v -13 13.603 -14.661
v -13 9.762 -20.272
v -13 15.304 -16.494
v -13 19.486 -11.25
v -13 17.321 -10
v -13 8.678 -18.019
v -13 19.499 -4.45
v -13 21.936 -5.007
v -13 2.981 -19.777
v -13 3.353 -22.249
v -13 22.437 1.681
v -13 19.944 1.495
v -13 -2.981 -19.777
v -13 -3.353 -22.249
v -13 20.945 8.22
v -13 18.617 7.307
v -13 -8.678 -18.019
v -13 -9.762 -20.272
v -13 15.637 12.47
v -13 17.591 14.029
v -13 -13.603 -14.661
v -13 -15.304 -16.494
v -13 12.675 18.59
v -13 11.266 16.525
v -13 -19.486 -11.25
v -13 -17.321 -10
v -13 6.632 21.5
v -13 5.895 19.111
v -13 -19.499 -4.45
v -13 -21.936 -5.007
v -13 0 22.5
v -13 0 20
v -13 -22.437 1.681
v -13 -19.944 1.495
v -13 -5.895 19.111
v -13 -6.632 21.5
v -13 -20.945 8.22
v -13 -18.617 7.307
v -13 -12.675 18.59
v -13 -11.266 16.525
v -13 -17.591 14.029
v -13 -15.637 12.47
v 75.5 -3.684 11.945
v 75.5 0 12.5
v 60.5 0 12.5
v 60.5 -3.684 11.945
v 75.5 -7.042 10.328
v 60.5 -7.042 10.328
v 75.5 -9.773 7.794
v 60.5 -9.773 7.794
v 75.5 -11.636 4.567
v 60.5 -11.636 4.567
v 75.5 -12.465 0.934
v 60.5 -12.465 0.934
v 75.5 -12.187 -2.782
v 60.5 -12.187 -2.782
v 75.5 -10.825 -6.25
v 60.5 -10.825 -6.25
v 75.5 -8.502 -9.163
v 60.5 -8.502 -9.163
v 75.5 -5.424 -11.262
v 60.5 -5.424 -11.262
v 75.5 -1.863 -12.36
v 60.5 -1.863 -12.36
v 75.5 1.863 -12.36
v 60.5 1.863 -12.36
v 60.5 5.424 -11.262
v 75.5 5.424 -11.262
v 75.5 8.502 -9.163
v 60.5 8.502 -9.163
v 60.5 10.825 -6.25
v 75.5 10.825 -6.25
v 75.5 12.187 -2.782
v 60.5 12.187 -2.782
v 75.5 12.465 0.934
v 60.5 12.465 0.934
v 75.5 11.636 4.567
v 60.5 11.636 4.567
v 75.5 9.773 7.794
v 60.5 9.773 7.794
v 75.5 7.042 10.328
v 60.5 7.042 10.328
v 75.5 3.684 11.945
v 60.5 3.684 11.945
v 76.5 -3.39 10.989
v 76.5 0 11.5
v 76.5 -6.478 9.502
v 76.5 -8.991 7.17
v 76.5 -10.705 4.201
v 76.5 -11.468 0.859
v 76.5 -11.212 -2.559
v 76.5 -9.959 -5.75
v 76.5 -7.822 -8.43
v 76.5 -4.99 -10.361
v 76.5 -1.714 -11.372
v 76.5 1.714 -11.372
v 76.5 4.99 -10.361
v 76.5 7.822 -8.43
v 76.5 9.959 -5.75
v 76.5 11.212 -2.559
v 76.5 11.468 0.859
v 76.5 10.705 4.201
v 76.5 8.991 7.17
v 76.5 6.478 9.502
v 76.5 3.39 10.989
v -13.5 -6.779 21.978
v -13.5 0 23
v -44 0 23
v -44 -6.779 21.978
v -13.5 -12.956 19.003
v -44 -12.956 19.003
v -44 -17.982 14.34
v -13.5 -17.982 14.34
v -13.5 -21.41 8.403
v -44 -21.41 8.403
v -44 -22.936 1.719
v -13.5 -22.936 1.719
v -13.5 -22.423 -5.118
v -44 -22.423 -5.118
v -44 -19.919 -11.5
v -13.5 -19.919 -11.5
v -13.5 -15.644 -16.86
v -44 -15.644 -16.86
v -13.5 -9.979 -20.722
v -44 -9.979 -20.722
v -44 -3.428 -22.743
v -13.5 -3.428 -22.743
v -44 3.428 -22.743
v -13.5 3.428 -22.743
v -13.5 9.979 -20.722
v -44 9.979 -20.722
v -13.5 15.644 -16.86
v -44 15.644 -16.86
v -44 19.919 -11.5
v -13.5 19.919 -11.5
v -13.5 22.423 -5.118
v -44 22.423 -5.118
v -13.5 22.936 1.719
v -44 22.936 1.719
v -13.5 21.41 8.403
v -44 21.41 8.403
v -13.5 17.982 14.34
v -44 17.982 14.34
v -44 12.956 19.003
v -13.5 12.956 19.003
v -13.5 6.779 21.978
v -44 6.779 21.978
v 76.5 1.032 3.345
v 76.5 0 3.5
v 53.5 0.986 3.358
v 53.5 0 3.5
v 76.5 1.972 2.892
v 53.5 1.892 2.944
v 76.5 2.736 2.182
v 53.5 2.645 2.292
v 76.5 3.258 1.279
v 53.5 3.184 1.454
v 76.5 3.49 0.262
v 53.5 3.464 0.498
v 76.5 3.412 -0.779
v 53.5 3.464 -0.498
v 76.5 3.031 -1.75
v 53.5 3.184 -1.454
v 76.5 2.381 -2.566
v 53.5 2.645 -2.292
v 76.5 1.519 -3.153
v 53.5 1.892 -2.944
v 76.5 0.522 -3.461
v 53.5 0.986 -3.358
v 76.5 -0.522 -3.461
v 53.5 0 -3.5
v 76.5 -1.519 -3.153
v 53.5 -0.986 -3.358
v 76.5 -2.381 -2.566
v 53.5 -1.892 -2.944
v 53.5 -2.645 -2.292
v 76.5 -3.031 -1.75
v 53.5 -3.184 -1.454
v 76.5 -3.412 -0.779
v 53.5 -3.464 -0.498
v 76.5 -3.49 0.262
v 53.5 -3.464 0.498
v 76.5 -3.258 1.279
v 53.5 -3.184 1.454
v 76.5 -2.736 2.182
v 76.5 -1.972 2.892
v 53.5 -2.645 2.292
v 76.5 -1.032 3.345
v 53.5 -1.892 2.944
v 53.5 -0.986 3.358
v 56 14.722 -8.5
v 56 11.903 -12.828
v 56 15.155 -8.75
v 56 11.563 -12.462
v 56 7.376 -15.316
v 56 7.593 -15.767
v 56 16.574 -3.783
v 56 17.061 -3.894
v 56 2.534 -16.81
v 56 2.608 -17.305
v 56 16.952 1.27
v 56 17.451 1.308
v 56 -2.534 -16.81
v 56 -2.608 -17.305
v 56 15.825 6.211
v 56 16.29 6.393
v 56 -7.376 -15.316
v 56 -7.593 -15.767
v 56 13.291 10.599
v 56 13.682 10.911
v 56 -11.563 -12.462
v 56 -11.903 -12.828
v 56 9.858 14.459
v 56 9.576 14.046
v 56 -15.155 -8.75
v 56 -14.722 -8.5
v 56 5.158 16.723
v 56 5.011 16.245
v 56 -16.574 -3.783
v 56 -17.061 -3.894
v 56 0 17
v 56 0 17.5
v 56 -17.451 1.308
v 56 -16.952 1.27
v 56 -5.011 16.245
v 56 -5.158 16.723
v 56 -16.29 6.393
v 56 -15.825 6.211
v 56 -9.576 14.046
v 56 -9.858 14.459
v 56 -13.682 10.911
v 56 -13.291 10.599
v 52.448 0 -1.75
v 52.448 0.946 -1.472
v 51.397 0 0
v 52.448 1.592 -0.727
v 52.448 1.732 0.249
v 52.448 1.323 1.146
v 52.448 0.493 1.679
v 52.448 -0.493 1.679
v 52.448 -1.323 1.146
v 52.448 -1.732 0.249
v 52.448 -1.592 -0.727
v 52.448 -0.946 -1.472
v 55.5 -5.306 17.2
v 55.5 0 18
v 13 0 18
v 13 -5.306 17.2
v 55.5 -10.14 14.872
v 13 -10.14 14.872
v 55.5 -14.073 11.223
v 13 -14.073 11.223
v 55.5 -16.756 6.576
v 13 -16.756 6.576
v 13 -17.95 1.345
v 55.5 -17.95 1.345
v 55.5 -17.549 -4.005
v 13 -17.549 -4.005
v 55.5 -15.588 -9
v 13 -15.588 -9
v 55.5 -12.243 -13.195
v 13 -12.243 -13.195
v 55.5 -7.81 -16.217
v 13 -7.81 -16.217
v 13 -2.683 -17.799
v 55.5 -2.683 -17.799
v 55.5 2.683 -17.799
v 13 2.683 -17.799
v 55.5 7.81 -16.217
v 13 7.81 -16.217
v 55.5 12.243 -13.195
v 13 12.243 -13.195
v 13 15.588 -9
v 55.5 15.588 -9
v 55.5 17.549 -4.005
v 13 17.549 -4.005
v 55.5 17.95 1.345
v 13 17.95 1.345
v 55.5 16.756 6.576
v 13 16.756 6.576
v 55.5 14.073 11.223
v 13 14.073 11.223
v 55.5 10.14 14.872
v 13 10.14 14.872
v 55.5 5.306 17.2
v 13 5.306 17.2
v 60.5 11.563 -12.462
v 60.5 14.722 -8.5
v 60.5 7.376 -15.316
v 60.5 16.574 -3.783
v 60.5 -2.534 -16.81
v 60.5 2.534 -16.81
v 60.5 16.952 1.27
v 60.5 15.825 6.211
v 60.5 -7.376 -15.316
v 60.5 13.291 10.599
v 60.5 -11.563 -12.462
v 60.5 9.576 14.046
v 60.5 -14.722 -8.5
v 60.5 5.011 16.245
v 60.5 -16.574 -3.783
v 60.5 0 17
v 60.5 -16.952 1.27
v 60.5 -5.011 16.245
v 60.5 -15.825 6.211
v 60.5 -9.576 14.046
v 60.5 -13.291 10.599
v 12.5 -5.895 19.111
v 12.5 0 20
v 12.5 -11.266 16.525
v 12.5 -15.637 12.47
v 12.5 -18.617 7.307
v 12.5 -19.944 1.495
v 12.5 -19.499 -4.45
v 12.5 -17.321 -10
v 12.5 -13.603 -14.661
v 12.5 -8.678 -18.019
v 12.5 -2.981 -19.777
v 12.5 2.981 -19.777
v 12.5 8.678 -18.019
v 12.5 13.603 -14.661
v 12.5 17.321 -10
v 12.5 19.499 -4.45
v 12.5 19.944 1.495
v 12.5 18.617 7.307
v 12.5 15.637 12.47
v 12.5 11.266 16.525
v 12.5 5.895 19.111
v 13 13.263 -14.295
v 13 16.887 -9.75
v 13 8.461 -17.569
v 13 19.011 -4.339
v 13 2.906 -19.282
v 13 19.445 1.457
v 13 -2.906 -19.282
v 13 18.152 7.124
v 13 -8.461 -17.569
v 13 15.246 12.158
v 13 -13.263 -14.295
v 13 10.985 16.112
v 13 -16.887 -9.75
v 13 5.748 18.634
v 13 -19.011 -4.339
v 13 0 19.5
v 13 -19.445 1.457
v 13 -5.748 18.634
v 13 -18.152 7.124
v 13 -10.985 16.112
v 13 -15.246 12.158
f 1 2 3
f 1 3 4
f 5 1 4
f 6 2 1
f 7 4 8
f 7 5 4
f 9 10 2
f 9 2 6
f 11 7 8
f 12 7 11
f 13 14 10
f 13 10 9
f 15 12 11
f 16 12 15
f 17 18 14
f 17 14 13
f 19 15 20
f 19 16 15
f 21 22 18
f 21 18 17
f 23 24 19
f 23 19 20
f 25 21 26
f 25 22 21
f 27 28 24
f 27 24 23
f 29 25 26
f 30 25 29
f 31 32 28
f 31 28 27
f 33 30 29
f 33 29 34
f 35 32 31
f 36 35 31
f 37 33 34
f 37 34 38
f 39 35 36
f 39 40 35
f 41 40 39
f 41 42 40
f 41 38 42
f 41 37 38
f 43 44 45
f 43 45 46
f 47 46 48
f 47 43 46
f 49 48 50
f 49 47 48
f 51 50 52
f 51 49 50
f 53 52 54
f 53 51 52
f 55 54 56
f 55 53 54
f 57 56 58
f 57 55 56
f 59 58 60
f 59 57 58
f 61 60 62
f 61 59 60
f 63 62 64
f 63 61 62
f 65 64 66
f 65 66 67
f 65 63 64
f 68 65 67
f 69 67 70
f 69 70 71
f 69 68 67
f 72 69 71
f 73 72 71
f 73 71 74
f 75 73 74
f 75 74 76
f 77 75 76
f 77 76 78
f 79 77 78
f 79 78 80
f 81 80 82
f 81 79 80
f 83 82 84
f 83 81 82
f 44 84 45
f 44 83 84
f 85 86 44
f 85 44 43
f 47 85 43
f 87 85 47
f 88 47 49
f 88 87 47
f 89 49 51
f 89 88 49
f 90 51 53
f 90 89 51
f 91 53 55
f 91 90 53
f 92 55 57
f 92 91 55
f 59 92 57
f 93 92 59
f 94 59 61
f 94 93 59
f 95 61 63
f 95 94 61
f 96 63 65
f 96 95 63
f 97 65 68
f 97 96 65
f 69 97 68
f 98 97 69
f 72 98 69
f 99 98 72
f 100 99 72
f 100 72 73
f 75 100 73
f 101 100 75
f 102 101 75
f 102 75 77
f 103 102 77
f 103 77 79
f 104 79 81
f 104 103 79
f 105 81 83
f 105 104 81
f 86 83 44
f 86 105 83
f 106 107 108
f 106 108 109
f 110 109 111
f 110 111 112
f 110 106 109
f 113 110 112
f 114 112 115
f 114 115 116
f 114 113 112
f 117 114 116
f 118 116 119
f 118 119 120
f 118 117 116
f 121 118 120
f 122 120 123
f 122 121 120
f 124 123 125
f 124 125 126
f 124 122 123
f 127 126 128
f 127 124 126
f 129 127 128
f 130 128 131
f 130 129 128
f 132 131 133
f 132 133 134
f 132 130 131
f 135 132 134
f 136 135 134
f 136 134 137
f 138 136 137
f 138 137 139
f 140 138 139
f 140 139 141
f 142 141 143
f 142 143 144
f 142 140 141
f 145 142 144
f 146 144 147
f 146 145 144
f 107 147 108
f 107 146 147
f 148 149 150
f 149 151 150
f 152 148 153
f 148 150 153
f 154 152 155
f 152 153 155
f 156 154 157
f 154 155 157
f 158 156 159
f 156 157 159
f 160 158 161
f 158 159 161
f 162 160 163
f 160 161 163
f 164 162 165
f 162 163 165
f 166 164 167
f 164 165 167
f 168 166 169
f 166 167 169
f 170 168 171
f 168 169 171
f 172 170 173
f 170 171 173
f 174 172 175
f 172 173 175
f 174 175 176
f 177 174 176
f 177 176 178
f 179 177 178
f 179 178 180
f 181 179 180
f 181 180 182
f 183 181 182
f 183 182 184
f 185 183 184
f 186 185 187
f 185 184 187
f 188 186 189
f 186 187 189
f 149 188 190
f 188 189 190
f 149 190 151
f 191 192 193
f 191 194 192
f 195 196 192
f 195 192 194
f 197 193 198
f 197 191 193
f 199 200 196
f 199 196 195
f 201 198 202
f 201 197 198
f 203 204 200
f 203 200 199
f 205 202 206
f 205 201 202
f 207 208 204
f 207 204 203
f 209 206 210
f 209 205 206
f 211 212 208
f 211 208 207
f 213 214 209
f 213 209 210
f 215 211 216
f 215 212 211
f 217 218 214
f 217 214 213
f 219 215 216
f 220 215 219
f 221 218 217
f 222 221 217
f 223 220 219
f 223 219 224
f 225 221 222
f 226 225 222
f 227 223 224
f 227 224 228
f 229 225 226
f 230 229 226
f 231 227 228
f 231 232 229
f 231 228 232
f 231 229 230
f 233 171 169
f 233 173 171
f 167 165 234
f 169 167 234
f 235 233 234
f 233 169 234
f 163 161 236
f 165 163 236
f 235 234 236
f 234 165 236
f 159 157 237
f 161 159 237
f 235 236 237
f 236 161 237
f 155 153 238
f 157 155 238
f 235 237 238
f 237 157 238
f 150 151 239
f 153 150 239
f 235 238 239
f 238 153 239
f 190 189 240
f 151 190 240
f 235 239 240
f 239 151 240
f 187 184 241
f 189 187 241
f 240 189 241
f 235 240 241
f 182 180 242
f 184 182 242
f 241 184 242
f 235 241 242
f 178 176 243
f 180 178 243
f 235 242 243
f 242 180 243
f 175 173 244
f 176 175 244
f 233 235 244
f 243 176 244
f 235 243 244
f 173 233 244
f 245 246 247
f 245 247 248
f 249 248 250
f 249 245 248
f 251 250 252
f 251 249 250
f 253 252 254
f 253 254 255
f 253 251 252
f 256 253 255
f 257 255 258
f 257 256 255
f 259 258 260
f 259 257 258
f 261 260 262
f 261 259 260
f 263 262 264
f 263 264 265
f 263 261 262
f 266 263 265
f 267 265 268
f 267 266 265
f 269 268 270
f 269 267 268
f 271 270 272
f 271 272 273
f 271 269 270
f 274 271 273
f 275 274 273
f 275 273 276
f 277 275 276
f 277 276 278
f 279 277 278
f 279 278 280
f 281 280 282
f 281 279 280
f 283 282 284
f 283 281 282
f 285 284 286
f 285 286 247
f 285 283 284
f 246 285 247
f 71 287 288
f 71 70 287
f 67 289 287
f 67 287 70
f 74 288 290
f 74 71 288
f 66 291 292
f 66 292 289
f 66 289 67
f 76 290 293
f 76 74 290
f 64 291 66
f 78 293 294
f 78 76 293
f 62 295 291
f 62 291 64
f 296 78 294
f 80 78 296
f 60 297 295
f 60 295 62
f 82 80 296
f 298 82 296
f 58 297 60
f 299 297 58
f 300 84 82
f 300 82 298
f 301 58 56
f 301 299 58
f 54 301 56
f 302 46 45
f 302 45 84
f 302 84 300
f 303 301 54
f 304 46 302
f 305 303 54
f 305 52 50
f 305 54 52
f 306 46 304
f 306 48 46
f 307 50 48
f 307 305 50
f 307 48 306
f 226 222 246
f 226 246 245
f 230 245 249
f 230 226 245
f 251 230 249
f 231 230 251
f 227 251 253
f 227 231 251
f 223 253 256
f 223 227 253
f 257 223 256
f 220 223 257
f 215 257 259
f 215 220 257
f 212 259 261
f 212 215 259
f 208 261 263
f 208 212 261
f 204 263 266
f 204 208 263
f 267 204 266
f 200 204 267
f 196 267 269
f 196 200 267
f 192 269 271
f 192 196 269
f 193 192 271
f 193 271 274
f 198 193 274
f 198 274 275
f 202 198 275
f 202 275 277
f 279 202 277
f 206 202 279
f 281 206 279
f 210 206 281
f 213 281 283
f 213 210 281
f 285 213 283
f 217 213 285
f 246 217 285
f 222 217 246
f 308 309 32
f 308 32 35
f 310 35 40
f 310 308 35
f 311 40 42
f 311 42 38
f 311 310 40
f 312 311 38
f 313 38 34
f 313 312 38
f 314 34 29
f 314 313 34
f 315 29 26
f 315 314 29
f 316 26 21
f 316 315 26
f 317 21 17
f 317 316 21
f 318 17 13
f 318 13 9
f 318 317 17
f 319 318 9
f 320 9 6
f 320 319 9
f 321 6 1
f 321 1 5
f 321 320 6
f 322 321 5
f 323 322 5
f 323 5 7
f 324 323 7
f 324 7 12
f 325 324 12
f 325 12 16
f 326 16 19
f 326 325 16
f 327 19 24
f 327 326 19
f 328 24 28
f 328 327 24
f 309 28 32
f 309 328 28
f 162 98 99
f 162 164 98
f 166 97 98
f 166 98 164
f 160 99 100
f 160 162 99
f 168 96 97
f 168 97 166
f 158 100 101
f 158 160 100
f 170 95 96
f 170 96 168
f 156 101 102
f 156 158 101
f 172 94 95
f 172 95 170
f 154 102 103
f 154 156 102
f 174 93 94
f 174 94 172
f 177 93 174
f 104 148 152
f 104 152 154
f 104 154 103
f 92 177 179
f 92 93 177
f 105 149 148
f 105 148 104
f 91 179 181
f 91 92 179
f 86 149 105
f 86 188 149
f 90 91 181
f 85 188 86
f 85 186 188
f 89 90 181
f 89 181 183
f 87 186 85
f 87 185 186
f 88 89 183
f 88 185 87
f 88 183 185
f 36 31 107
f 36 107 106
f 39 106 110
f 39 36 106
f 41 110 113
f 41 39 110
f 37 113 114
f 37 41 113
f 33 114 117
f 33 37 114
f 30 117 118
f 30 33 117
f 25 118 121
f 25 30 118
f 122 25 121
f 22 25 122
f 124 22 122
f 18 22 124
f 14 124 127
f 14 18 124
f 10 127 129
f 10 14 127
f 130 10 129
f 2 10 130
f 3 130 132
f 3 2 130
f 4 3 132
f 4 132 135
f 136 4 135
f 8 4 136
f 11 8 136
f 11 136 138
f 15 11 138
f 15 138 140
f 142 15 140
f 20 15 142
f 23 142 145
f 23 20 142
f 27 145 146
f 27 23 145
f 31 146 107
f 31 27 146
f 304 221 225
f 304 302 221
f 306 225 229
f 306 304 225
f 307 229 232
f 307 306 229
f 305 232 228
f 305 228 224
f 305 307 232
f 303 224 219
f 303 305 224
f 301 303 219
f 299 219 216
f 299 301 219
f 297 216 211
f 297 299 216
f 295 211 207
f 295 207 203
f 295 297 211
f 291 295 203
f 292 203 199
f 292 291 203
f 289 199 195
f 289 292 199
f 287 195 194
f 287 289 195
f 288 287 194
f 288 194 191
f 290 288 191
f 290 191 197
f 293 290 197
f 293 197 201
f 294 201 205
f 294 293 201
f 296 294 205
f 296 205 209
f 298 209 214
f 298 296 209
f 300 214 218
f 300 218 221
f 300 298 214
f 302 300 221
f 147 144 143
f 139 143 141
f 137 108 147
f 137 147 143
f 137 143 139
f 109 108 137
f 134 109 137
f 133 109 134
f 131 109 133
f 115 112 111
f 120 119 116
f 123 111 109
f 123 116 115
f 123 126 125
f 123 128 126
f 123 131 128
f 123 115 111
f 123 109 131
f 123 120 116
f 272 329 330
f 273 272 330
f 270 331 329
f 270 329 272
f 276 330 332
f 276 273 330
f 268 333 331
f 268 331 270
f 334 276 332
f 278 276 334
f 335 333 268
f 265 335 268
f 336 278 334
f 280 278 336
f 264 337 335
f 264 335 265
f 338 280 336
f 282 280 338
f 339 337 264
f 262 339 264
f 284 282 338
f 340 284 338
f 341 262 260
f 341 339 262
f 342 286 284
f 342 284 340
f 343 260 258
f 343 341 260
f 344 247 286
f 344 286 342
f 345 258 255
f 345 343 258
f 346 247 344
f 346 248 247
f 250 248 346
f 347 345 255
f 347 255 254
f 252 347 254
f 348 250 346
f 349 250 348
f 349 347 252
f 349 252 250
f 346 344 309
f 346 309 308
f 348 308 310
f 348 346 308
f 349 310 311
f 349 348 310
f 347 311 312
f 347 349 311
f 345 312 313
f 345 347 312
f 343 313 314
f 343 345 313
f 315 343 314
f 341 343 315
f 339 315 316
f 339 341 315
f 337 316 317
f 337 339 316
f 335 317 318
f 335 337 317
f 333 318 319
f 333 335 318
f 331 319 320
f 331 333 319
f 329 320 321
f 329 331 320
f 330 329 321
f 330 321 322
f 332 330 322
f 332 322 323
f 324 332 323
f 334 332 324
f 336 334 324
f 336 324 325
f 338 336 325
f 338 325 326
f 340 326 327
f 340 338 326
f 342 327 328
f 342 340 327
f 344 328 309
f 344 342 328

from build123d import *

# Parameters (mm, degrees)
CHANFREIN1_SIZE           = 0.5
CHANFREIN2_SIZE           = 1
TROU_TARAUD_M8X1_01_D     = 7
TROU_TARAUD_M8X1_01_DEPTH = 23
TROU_TARAUD_M8X1_01_TIP   = 2.103012167


with BuildPart() as part:
    # Esquisse1 → Révolution1 (revolve)
    with BuildSketch(Plane.XY, mode=Mode.PRIVATE) as r_volution1_sk:
        Polygon((-44, 23), (-13, 23), (-13, 20), (13, 20), (13, 18), (56, 18), (56, 17), (60.5, 17), (60.5, 12.5), (76.5, 12.5), (76.5, 0), (-44, 0), align=None)
    revolve(r_volution1_sk.sketch.rotate(Axis((-47.210983023, 0, 0), (1, 0, 0)), 90), axis=Axis((-47.210983023, 0, 0), (1, 0, 0)))

    # Chanfrein1
    chanfrein1_edges = [part.edges().sort_by_distance(p)[0] for p in [
        (56, 0, -18),
        (13, 0, -20),
        (-13, 0, -23),
    ]]
    chamfer(chanfrein1_edges, length=CHANFREIN1_SIZE)

    # Chanfrein2
    chanfrein2_edges = [part.edges().sort_by_distance(p)[0] for p in [
        (76.5, 0, -12.5),
    ]]
    chamfer(chanfrein2_edges, length=CHANFREIN2_SIZE)

    # Trou taraudé M8x1.01
    with Locations(Plane(origin=(76.5, 0, 0), x_dir=(0, 0, -1), z_dir=(1, 0, 0))):
        with Locations((0, 0)):
            Hole(TROU_TARAUD_M8X1_01_D / 2, depth=TROU_TARAUD_M8X1_01_DEPTH)
            with Locations((0, 0, -(TROU_TARAUD_M8X1_01_DEPTH + TROU_TARAUD_M8X1_01_TIP / 2))):  # 118° drill point
                Cone(0, TROU_TARAUD_M8X1_01_D / 2, TROU_TARAUD_M8X1_01_TIP, mode=Mode.SUBTRACT)


solid = part.part
